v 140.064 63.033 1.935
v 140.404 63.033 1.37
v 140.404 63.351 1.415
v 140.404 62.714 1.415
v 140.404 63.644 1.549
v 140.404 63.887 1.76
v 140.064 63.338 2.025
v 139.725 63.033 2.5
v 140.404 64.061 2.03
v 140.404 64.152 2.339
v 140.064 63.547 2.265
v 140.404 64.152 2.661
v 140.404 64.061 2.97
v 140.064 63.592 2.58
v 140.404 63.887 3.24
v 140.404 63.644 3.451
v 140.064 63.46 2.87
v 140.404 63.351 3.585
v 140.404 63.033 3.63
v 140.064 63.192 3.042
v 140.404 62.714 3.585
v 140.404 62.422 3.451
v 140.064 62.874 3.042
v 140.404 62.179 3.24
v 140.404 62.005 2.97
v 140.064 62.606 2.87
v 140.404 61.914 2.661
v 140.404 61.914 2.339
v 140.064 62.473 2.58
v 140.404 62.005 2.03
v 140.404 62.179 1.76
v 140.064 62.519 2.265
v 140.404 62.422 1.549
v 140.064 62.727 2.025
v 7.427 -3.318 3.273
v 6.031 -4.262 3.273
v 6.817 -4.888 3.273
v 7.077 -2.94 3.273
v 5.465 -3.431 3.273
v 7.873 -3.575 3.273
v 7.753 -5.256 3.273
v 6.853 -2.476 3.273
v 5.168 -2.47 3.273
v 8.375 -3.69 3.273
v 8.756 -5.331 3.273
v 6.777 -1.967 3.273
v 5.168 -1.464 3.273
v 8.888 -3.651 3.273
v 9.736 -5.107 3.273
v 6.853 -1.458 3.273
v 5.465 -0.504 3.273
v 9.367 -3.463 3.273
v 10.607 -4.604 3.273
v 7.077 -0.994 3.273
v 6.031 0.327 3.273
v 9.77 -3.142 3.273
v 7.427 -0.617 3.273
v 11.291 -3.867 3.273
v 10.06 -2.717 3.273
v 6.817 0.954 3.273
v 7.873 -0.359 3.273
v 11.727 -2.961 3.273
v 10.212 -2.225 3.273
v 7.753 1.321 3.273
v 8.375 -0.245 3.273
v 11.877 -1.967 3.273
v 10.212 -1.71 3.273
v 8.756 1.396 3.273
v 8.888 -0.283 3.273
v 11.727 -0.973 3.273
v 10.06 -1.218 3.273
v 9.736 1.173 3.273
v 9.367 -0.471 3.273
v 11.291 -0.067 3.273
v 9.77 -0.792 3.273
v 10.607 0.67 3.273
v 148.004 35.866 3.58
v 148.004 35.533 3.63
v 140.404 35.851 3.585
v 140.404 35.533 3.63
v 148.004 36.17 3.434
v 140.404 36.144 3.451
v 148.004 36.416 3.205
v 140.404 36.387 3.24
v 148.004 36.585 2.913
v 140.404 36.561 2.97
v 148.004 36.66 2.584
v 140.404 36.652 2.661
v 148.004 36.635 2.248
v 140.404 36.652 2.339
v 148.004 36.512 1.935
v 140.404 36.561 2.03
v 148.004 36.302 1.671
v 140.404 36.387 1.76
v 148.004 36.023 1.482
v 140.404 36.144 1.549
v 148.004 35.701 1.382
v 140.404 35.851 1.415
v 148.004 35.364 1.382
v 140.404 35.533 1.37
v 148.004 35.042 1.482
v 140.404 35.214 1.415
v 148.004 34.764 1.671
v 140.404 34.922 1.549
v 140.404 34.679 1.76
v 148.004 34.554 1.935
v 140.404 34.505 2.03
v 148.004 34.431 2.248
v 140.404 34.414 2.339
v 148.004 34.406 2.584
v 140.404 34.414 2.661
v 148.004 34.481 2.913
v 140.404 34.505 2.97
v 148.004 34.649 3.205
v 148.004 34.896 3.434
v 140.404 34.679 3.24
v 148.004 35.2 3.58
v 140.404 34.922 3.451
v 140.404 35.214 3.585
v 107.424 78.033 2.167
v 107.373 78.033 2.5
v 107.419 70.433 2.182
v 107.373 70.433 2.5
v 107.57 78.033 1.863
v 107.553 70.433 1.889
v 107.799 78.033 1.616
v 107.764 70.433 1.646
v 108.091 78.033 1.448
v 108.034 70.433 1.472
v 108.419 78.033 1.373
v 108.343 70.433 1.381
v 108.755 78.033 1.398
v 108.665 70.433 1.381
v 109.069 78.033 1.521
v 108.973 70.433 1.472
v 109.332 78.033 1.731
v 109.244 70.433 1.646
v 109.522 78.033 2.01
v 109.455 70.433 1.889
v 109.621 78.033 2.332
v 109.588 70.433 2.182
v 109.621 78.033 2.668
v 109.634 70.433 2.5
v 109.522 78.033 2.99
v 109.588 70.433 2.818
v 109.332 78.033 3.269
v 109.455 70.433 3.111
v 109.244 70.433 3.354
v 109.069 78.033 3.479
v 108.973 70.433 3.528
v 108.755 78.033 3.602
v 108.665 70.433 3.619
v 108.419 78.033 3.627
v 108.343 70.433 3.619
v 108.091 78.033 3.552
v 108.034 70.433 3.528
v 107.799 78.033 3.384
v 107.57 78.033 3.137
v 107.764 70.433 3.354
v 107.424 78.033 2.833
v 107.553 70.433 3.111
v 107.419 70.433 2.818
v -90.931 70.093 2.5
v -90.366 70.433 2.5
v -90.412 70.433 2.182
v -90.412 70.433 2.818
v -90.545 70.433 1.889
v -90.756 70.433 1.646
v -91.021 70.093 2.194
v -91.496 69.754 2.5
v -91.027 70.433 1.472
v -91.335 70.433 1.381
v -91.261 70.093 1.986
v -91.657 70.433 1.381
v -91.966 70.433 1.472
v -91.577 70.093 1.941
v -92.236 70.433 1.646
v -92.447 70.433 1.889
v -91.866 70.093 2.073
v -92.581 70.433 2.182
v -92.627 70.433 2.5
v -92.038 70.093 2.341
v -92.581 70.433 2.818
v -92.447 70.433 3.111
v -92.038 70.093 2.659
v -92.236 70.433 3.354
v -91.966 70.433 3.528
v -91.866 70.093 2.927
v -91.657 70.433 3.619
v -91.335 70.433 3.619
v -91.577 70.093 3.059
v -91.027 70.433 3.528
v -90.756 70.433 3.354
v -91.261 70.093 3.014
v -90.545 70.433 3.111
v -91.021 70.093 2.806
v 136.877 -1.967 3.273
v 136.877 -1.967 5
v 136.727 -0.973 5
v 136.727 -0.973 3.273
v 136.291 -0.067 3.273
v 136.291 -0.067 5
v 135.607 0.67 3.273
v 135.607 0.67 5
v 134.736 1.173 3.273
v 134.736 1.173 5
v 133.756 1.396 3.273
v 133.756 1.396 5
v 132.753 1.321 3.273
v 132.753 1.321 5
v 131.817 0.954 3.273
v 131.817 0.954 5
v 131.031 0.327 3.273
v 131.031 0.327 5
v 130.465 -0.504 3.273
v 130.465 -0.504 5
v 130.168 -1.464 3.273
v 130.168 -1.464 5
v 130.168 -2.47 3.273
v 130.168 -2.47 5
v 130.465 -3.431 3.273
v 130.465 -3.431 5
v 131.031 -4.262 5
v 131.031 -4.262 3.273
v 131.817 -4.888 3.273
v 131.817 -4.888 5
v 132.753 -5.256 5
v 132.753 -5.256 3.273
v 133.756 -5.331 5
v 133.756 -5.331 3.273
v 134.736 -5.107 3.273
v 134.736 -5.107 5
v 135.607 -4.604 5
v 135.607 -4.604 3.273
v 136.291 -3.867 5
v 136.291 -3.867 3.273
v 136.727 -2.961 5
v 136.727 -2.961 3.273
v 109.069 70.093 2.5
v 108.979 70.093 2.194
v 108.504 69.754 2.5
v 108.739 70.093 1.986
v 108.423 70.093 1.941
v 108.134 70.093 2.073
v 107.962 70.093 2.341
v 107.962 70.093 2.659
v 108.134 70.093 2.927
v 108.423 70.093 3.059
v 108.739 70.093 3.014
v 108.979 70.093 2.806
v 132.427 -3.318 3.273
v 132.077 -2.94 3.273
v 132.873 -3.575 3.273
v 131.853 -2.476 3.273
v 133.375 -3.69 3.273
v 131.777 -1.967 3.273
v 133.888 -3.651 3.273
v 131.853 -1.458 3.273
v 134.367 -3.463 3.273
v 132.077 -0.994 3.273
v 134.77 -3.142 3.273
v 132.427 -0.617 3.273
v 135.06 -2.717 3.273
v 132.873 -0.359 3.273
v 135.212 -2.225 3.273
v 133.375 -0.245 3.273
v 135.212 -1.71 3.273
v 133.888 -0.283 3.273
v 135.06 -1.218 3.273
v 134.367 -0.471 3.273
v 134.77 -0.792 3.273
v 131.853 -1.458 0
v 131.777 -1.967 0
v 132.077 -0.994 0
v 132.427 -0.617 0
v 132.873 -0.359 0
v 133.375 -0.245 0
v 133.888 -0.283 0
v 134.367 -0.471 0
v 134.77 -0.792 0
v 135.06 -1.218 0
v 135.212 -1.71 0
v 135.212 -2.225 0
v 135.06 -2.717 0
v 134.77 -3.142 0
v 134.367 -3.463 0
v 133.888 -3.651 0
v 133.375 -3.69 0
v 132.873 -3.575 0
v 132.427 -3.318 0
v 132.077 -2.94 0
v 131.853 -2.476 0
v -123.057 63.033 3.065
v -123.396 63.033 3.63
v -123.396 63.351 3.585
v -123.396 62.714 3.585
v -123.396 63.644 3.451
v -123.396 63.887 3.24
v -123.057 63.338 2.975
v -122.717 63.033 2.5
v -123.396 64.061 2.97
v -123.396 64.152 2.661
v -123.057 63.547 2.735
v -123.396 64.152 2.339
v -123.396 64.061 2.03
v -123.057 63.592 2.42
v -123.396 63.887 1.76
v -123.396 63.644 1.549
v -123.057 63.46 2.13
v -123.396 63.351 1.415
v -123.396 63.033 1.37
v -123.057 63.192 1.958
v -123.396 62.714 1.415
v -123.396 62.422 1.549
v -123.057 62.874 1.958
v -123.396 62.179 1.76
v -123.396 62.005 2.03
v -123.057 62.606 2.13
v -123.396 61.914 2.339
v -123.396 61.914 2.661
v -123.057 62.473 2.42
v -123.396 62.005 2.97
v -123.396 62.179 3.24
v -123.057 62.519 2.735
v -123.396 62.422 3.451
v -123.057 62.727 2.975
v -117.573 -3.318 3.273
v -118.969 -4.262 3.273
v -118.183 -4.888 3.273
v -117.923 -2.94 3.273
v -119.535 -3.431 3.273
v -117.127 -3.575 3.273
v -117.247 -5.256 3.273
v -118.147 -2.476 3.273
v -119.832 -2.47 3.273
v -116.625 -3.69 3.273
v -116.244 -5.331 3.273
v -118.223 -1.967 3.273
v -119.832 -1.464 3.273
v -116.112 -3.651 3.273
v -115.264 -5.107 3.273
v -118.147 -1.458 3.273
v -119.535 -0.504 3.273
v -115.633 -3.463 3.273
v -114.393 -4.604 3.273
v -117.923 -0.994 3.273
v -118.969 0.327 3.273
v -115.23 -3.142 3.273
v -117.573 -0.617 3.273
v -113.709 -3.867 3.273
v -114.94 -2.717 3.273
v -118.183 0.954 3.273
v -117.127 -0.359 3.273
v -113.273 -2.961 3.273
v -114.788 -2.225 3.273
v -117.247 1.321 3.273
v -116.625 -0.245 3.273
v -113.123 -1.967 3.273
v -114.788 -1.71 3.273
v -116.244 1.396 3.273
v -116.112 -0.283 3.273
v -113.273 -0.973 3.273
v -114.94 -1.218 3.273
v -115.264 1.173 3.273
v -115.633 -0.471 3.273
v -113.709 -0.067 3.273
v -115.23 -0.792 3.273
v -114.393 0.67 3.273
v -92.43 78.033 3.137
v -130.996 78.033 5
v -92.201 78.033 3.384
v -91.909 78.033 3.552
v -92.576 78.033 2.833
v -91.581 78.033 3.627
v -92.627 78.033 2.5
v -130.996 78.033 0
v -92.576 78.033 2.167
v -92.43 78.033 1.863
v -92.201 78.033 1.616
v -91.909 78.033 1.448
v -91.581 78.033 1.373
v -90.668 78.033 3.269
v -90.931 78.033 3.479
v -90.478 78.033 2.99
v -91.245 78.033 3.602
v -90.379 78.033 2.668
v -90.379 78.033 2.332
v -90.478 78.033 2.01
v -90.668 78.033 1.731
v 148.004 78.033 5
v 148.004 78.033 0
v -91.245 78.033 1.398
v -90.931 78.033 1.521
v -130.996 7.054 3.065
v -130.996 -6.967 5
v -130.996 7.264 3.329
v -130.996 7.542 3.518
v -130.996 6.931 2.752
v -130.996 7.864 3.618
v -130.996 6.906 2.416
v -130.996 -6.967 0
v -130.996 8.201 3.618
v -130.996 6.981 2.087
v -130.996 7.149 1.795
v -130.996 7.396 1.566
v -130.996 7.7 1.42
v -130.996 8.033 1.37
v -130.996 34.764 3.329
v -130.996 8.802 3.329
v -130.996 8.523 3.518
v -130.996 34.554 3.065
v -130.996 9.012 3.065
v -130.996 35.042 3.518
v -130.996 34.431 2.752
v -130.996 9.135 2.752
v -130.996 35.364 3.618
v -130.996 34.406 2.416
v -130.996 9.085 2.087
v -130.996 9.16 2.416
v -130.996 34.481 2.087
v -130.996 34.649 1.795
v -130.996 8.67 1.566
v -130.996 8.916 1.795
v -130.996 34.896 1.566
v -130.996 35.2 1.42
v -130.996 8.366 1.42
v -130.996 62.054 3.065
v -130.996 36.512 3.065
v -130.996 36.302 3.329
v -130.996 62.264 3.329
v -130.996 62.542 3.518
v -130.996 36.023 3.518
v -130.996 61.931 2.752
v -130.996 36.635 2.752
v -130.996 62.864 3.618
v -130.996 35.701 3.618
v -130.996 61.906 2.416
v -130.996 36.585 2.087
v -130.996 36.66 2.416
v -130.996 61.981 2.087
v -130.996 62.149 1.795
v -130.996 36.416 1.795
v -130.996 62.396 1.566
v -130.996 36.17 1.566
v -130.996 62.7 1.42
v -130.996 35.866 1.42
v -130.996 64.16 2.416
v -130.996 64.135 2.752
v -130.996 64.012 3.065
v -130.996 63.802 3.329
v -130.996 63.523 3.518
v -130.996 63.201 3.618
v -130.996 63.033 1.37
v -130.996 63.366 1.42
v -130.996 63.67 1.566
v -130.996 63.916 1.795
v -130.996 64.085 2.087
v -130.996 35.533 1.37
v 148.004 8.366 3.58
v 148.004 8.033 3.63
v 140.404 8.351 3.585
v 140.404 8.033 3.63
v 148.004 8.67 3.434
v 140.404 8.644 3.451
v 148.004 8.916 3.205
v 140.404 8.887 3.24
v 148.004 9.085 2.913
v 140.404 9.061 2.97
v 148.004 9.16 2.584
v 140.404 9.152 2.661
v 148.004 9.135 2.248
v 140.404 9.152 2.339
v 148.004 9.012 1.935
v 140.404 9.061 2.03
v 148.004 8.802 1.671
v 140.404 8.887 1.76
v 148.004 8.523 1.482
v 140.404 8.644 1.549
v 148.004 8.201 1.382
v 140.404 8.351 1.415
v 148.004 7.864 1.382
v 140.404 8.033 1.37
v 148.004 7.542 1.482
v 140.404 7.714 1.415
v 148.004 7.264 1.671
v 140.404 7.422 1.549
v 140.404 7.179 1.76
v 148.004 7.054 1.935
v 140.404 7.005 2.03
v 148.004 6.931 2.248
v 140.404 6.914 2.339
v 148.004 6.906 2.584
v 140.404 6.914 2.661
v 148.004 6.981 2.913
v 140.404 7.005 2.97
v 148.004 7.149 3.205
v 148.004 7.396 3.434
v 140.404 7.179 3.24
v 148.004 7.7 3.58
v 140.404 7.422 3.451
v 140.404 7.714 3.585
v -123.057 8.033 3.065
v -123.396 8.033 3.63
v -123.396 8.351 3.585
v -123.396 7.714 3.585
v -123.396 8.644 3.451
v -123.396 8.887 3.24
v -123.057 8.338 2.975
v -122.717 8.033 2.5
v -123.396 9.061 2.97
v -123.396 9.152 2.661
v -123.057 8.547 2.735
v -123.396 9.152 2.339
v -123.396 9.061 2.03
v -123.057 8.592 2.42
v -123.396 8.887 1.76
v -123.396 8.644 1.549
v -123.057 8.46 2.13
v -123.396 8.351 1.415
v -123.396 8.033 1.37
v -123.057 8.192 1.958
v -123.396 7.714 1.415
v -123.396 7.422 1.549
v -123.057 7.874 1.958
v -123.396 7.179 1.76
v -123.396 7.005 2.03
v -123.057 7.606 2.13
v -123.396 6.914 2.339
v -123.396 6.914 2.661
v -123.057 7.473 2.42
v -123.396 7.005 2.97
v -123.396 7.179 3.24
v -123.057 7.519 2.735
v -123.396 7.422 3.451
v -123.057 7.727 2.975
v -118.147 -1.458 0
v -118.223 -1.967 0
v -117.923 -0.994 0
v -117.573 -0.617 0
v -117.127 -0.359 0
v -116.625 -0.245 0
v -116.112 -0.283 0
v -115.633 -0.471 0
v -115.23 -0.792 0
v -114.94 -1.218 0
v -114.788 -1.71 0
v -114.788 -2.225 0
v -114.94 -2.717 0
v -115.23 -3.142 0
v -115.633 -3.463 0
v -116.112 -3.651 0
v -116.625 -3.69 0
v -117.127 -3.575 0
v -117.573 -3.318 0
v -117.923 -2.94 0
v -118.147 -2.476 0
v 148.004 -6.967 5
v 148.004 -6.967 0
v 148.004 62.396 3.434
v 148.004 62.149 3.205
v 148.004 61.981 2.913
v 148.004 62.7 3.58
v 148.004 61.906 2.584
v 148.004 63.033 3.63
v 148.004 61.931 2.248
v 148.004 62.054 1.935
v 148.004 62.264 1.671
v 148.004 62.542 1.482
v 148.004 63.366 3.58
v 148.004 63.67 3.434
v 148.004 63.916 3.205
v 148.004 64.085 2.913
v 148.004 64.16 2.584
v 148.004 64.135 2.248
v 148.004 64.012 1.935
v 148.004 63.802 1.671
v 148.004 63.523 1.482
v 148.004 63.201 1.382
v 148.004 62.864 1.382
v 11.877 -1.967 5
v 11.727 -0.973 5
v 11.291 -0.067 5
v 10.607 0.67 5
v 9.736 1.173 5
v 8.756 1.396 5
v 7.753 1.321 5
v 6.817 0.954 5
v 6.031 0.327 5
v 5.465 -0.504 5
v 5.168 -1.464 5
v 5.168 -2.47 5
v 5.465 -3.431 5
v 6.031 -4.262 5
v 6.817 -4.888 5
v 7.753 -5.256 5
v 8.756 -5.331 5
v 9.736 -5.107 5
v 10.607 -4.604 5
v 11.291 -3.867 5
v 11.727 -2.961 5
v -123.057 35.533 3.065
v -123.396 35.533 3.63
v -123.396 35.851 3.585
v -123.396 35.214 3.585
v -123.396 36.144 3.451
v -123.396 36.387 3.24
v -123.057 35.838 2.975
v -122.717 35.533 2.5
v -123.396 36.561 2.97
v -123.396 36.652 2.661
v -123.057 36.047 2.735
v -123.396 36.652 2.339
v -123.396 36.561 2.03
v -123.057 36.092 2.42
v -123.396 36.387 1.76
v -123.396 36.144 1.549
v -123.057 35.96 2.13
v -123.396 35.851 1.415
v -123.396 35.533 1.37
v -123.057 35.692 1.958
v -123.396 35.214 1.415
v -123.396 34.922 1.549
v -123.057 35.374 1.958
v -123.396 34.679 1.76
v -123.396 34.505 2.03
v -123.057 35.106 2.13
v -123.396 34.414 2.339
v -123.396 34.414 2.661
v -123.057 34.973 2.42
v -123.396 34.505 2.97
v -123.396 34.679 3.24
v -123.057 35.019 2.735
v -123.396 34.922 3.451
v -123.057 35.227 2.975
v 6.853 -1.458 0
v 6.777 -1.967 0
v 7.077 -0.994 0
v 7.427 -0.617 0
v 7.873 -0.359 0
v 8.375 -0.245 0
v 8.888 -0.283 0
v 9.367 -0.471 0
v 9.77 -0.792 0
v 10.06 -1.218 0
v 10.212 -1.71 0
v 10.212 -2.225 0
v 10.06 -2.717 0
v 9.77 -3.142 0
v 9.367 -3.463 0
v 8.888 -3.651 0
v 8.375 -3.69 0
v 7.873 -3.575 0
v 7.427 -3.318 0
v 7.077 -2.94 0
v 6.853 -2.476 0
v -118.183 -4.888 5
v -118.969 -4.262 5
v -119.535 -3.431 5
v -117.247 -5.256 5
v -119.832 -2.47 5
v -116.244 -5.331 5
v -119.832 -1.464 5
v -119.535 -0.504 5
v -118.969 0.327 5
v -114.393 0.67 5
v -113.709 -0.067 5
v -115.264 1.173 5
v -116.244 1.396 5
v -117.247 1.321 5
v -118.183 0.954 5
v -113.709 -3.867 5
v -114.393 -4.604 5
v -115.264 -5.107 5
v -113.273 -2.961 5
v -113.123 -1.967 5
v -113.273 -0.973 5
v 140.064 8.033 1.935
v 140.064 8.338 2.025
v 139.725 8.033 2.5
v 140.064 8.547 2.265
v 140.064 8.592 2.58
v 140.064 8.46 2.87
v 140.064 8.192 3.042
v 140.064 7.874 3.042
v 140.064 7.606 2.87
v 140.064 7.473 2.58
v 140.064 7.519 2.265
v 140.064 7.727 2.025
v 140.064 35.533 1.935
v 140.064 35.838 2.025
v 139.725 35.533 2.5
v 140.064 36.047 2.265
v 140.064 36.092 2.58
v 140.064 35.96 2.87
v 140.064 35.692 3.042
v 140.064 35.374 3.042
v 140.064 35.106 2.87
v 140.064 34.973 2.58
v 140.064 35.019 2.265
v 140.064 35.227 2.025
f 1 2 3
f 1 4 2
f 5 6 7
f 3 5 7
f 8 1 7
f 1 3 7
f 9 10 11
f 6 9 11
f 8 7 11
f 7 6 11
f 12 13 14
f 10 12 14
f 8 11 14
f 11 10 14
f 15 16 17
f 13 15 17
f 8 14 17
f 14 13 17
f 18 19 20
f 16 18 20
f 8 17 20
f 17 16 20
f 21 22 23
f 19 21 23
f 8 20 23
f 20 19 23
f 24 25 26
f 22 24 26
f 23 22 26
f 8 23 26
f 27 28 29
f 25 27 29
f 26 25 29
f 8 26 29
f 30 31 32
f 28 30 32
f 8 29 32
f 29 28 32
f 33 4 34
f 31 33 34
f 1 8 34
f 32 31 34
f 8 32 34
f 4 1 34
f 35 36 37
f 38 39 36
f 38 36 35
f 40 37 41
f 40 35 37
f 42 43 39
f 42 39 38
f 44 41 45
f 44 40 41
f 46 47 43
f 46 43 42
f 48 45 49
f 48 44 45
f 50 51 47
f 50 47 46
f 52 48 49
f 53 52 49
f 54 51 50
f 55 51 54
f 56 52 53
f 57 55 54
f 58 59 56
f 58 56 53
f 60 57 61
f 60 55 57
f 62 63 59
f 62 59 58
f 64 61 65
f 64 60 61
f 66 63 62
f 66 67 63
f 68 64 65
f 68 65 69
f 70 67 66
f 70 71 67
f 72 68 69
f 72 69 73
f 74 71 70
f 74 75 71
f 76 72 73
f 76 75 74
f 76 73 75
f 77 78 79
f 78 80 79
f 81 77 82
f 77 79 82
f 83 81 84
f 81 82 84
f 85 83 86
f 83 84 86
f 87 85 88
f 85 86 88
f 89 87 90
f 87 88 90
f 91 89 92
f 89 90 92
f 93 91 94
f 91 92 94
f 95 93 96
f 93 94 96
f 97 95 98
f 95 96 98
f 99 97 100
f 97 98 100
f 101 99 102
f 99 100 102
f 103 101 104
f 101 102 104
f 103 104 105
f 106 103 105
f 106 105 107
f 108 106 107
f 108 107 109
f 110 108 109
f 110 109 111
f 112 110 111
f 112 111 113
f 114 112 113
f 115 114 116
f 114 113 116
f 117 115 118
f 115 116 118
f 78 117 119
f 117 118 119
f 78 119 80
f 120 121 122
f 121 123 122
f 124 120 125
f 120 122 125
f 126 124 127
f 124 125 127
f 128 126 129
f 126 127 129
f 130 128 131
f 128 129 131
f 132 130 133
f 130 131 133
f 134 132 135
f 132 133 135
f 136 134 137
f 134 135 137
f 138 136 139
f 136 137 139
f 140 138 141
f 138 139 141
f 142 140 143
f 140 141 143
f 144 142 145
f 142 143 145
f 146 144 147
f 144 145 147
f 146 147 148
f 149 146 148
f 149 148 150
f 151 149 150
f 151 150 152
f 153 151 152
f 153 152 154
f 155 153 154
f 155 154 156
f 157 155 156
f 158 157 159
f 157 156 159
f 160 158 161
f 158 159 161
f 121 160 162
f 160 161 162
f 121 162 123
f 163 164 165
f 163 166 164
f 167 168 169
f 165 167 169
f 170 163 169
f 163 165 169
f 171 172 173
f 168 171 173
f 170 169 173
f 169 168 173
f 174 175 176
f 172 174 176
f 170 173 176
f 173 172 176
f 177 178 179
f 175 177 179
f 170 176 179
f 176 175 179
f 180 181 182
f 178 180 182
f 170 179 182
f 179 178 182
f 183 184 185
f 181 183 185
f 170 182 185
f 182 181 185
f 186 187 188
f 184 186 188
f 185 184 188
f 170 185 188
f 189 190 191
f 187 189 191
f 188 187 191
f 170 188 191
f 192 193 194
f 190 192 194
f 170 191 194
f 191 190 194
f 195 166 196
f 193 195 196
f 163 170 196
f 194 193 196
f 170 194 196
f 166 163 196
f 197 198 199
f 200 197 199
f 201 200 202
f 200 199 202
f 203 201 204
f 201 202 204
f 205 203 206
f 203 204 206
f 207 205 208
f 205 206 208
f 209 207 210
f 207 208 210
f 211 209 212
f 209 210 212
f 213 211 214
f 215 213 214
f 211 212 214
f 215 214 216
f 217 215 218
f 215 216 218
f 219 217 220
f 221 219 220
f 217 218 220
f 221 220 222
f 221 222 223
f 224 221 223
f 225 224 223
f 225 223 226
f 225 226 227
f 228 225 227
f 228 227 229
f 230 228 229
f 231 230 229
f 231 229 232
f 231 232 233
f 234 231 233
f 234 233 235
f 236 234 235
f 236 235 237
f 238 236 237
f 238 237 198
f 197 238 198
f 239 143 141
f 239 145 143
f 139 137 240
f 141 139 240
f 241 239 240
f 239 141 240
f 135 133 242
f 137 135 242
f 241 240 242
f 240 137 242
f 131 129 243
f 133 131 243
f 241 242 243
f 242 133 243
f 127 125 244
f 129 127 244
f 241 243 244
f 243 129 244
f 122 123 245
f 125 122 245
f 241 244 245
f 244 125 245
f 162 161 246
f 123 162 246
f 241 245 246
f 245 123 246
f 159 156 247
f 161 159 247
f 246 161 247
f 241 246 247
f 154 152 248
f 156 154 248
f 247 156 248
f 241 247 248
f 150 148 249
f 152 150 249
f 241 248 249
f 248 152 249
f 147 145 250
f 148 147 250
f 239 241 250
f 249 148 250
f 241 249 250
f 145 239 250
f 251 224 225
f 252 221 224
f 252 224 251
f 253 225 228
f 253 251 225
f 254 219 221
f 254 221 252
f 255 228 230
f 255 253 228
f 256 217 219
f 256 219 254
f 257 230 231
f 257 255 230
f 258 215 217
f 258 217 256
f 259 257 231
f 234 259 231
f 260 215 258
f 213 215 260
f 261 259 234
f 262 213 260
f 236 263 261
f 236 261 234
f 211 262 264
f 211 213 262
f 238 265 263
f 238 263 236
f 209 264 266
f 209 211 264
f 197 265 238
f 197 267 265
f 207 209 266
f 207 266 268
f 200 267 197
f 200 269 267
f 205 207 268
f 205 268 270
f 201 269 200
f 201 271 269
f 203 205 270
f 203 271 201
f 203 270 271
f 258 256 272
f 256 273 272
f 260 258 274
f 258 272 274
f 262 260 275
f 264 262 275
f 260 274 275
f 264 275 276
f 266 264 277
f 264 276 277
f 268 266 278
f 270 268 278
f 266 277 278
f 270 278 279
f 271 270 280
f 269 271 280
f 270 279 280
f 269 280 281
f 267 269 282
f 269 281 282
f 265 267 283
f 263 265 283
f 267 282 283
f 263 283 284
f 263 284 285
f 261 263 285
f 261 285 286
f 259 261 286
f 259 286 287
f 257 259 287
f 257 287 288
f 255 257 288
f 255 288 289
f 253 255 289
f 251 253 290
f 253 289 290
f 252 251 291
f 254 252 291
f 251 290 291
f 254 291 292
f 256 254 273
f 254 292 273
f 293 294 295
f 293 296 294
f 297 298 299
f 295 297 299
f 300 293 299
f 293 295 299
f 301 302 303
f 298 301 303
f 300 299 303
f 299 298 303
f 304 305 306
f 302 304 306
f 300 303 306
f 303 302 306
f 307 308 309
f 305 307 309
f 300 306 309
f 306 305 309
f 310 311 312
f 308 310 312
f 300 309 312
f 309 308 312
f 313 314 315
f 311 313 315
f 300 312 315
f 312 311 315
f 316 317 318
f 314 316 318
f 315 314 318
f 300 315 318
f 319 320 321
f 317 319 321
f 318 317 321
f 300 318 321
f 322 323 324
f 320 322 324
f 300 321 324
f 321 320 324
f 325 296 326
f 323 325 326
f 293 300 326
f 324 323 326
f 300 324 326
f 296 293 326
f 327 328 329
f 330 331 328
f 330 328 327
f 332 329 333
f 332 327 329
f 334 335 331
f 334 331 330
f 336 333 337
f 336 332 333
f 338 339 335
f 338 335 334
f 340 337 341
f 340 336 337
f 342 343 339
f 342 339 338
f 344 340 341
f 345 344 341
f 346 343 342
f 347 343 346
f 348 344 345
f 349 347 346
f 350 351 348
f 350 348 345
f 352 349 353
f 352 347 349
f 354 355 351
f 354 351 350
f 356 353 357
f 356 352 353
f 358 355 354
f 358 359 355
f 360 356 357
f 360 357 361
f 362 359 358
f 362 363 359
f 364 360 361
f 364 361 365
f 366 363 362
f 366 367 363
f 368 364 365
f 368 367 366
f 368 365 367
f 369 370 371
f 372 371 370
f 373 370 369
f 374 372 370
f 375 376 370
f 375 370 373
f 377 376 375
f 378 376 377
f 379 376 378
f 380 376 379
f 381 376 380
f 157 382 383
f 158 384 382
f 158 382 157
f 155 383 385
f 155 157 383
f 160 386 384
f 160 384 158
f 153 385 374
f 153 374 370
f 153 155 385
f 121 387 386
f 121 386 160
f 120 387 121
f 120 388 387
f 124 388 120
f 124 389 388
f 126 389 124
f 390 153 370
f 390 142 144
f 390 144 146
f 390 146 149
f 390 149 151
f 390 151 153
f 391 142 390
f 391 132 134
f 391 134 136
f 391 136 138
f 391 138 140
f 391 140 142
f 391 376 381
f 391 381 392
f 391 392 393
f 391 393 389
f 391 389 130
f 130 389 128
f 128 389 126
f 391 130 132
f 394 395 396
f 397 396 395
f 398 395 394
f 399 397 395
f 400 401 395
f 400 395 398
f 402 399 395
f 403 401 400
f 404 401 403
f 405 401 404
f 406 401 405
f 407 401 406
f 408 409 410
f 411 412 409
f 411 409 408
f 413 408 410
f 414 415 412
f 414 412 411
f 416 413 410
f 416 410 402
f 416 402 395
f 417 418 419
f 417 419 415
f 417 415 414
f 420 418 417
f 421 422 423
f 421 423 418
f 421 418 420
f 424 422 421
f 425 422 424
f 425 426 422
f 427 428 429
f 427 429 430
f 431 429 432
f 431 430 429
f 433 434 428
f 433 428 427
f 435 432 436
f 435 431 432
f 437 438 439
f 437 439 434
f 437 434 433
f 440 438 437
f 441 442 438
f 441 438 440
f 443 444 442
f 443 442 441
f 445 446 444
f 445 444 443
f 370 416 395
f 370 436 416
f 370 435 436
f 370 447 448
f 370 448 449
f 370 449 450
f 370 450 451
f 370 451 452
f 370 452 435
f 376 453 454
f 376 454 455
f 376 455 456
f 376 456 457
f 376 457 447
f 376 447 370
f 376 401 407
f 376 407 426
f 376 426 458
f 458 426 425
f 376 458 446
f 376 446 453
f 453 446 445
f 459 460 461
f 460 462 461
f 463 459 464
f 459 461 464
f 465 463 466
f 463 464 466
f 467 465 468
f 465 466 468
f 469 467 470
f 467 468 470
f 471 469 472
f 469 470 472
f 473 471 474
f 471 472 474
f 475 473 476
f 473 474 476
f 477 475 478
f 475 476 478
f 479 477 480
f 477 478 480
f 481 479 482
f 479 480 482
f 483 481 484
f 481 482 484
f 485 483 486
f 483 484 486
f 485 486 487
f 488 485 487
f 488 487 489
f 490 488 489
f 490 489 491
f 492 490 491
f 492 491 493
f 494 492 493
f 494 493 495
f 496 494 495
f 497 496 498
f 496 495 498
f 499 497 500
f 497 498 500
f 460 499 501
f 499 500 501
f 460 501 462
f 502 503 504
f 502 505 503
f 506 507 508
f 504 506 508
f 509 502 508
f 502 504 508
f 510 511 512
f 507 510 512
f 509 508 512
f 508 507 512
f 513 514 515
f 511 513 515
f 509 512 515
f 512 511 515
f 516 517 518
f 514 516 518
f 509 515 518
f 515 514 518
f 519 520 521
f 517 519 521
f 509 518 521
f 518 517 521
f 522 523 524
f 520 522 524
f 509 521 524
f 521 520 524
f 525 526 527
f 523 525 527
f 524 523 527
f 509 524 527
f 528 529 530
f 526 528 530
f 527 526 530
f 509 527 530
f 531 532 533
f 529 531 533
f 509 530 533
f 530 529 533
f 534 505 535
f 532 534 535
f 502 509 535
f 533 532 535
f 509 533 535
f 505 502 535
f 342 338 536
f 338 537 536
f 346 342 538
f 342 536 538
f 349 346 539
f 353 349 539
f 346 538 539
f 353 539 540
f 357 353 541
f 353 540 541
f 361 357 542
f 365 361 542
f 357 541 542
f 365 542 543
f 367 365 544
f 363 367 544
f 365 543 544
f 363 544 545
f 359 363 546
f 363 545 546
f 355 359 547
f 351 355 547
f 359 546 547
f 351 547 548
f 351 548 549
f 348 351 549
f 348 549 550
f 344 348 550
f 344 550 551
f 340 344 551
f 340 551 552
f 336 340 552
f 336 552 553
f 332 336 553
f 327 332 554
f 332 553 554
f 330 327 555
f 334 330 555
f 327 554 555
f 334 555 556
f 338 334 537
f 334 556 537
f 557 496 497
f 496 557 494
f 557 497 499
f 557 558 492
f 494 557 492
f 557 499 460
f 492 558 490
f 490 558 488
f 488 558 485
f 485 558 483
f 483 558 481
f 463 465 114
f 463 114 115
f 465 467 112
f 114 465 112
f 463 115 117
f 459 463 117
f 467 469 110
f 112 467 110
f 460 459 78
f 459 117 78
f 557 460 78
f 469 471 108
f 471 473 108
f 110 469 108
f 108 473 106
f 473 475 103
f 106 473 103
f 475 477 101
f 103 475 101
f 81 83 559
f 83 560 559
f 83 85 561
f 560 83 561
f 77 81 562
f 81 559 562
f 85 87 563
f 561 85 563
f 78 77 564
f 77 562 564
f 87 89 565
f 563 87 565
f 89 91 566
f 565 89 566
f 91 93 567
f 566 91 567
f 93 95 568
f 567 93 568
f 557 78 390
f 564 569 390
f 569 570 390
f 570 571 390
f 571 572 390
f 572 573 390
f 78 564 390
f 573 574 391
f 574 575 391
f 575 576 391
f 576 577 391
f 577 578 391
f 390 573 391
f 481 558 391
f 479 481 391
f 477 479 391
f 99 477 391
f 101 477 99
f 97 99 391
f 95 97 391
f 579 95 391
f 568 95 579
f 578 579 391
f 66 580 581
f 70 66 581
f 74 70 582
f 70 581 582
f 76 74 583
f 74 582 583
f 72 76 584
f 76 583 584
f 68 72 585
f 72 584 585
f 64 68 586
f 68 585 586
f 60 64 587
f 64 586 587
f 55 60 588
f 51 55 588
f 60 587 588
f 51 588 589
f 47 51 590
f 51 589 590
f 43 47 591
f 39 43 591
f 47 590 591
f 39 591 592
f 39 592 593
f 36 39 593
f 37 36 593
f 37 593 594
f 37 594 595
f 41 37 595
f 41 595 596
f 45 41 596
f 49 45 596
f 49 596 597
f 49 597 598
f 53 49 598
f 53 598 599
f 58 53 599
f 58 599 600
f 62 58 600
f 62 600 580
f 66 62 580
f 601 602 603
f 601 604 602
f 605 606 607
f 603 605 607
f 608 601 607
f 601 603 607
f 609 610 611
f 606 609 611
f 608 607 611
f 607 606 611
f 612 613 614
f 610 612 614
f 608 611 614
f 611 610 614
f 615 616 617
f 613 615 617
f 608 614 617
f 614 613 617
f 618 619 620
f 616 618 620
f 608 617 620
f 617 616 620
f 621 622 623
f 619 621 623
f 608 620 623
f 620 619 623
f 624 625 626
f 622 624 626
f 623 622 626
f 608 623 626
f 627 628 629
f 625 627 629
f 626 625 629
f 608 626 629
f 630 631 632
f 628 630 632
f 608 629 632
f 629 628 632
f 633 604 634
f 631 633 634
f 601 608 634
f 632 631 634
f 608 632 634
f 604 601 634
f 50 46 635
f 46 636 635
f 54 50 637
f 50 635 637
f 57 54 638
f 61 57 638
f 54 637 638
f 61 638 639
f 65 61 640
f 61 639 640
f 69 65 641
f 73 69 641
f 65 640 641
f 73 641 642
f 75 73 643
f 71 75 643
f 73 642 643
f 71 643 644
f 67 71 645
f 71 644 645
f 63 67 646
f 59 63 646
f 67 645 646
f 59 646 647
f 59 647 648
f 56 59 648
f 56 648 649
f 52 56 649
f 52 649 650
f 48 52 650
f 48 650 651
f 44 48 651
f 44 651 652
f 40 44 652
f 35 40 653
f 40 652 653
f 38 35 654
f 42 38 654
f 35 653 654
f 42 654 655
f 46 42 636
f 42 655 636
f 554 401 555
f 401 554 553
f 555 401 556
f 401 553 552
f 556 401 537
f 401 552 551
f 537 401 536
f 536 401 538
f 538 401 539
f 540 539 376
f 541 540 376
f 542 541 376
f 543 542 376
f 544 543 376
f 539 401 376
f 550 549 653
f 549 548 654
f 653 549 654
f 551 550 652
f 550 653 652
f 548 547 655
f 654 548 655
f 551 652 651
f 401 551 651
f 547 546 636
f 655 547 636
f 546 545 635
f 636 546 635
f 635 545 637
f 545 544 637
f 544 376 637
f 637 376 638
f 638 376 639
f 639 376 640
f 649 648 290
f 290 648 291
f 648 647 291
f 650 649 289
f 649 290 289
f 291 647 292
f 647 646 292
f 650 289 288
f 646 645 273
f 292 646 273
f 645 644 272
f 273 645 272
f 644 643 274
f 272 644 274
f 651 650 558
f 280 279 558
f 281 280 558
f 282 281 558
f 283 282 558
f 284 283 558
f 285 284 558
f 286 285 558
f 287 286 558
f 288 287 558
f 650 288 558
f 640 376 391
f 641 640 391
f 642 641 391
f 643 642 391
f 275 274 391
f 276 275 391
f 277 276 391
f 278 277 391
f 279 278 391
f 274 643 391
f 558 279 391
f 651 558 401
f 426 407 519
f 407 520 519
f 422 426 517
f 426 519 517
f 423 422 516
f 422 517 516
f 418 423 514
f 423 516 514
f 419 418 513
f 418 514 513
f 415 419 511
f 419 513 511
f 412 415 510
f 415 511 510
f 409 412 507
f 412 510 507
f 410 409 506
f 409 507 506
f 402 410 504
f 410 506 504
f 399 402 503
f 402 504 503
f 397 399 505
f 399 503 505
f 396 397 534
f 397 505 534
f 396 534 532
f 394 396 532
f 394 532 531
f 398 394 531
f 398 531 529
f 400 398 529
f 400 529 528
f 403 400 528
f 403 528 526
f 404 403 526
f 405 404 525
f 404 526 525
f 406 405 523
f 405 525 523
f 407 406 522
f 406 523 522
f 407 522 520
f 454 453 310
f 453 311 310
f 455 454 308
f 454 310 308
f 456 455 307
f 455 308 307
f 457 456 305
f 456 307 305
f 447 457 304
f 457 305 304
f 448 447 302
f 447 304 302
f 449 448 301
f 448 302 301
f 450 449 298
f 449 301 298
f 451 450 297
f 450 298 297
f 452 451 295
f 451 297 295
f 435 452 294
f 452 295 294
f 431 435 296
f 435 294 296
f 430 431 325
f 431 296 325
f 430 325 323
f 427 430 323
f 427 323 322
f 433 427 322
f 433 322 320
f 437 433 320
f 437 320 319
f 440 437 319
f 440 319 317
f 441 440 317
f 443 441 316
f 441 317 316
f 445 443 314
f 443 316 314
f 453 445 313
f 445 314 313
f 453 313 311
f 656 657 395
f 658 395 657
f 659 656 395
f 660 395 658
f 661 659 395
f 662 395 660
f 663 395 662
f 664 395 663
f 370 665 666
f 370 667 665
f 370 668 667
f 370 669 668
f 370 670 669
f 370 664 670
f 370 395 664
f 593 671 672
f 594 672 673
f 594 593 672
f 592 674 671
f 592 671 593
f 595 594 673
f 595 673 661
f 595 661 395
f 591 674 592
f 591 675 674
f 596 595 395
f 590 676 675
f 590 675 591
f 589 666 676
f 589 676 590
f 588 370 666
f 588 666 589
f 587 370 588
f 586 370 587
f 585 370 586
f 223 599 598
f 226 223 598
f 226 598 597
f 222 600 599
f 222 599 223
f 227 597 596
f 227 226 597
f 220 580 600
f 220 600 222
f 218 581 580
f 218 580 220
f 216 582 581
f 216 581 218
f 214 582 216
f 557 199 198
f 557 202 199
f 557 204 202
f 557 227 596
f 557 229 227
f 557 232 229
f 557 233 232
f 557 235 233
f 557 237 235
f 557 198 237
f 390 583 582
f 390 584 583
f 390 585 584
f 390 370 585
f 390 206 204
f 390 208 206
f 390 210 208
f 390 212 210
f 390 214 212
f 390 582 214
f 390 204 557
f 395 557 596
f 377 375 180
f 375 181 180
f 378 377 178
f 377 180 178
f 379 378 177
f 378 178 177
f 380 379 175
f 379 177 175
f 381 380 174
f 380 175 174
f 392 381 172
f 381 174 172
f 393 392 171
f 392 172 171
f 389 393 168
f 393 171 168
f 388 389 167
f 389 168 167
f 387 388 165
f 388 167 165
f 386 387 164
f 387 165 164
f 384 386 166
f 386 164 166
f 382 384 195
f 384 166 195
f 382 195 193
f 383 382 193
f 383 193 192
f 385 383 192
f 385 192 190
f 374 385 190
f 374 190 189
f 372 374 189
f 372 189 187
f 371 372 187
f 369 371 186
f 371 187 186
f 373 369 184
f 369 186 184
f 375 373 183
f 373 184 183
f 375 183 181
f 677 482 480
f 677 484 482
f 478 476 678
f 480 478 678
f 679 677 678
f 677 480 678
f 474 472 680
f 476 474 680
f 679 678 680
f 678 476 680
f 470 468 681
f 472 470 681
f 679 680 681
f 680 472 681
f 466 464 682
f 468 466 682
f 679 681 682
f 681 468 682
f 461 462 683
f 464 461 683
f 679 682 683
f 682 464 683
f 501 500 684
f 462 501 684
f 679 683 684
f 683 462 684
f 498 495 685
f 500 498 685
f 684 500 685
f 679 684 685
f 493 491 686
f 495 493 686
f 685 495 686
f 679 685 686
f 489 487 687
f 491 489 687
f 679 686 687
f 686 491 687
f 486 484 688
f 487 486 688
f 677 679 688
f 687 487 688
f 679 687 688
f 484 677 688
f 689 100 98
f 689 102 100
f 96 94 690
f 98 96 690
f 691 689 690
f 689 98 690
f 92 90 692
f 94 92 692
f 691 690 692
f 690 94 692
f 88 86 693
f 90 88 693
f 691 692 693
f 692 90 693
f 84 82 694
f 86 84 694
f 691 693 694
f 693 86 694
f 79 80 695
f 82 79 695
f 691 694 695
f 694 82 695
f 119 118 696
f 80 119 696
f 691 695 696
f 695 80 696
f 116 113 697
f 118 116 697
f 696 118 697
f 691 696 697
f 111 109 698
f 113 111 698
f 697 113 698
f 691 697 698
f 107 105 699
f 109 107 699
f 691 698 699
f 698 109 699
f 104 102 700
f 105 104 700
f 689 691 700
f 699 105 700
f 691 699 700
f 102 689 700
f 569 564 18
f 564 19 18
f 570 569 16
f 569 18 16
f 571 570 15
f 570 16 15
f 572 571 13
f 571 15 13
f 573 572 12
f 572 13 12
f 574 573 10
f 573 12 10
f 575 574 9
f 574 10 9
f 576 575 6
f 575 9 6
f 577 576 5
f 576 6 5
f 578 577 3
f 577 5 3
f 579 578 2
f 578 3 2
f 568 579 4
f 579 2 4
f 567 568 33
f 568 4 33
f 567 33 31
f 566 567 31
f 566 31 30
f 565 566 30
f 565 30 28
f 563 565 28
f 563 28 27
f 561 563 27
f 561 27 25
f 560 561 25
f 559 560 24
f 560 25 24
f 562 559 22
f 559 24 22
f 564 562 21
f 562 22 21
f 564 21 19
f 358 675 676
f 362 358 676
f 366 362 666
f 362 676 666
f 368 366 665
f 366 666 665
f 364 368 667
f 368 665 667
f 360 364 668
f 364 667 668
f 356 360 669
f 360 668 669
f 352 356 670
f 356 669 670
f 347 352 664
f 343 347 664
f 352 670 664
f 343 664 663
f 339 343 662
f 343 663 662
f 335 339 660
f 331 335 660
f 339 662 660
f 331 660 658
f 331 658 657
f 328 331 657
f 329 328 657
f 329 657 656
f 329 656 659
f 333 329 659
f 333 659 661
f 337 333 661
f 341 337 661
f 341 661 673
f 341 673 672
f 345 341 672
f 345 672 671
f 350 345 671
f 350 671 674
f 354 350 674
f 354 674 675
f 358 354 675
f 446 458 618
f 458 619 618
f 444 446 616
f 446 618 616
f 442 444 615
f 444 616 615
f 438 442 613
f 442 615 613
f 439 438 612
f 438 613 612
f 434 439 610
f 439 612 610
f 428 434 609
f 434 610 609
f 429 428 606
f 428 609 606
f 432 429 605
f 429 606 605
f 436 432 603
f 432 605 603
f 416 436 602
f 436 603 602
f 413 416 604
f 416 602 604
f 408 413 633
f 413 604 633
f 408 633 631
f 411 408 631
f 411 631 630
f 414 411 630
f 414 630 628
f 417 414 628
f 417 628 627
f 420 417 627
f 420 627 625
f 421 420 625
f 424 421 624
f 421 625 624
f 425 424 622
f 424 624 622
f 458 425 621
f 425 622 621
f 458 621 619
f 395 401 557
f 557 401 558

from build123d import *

# Parameters (mm, degrees)
SKETCH1_W                                           = 279
SKETCH1_H                                           = 85
BOSS_EXTRUDE1_DEPTH                                 = 5
CBORE_FOR_4_BINDING_HEAD_MACHINE_SCREW1_D           = 3.4544
CBORE_FOR_4_BINDING_HEAD_MACHINE_SCREW1_CBORE_D     = 6.74624
CBORE_FOR_4_BINDING_HEAD_MACHINE_SCREW1_CBORE_DEPTH = 1.7272
F_4_40_TAPPED_HOLE1_D                               = 2.2606
F_4_40_TAPPED_HOLE1_DEPTH                           = 7.6
F_4_40_TAPPED_HOLE1_TIP                             = 0.679152758
F_4_40_TAPPED_HOLE2_D                               = 2.2606
F_4_40_TAPPED_HOLE2_DEPTH                           = 7.6
F_4_40_TAPPED_HOLE2_TIP                             = 0.679152758
F_4_40_TAPPED_HOLE3_D                               = 2.2606
F_4_40_TAPPED_HOLE3_DEPTH                           = 7.6
F_4_40_TAPPED_HOLE3_TIP                             = 0.679152758


with BuildPart() as part:
    # Sketch1 → Boss-Extrude1 (new body)
    with BuildSketch(Plane.XY):
        with Locations((8.503783102, 35.532786885)):
            Rectangle(SKETCH1_W, SKETCH1_H)
    extrude(amount=BOSS_EXTRUDE1_DEPTH)

    # CBORE for #4 Binding Head Machine Screw1 (through all)
    with Locations(Plane.XY.offset(5)):
        with Locations((-116.496216898, -1.967213115), (8.503783102, -1.967213115), (133.503783102, -1.967213115)):
            CounterBoreHole(CBORE_FOR_4_BINDING_HEAD_MACHINE_SCREW1_D / 2, CBORE_FOR_4_BINDING_HEAD_MACHINE_SCREW1_CBORE_D / 2, CBORE_FOR_4_BINDING_HEAD_MACHINE_SCREW1_CBORE_DEPTH)

    # #4-40 Tapped Hole1
    with Locations(Plane.ZY.offset(130.996216898)):
        with Locations((2.5, 63.032786885), (2.5, 35.532786885), (2.5, 8.032786885)):
            Hole(F_4_40_TAPPED_HOLE1_D / 2, depth=F_4_40_TAPPED_HOLE1_DEPTH)
            with Locations((0, 0, -(F_4_40_TAPPED_HOLE1_DEPTH + F_4_40_TAPPED_HOLE1_TIP / 2))):  # 118° drill point
                Cone(0, F_4_40_TAPPED_HOLE1_D / 2, F_4_40_TAPPED_HOLE1_TIP, mode=Mode.SUBTRACT)

    # #4-40 Tapped Hole2
    with Locations(Plane(origin=(148.003783102, 0, 0), x_dir=(0, 0, -1), z_dir=(1, 0, 0))):
        with Locations((-2.5, 63.032786885), (-2.5, 35.532786885), (-2.5, 8.032786885)):
            Hole(F_4_40_TAPPED_HOLE2_D / 2, depth=F_4_40_TAPPED_HOLE2_DEPTH)
            with Locations((0, 0, -(F_4_40_TAPPED_HOLE2_DEPTH + F_4_40_TAPPED_HOLE2_TIP / 2))):  # 118° drill point
                Cone(0, F_4_40_TAPPED_HOLE2_D / 2, F_4_40_TAPPED_HOLE2_TIP, mode=Mode.SUBTRACT)

    # #4-40 Tapped Hole3
    with Locations(Plane(origin=(0, 78.032786885, 0), x_dir=(1, 0, 0), z_dir=(0, 1, 0))):
        with Locations((-91.496216898, -2.5), (108.503783102, -2.5)):
            Hole(F_4_40_TAPPED_HOLE3_D / 2, depth=F_4_40_TAPPED_HOLE3_DEPTH)
            with Locations((0, 0, -(F_4_40_TAPPED_HOLE3_DEPTH + F_4_40_TAPPED_HOLE3_TIP / 2))):  # 118° drill point
                Cone(0, F_4_40_TAPPED_HOLE3_D / 2, F_4_40_TAPPED_HOLE3_TIP, mode=Mode.SUBTRACT)


solid = part.part
